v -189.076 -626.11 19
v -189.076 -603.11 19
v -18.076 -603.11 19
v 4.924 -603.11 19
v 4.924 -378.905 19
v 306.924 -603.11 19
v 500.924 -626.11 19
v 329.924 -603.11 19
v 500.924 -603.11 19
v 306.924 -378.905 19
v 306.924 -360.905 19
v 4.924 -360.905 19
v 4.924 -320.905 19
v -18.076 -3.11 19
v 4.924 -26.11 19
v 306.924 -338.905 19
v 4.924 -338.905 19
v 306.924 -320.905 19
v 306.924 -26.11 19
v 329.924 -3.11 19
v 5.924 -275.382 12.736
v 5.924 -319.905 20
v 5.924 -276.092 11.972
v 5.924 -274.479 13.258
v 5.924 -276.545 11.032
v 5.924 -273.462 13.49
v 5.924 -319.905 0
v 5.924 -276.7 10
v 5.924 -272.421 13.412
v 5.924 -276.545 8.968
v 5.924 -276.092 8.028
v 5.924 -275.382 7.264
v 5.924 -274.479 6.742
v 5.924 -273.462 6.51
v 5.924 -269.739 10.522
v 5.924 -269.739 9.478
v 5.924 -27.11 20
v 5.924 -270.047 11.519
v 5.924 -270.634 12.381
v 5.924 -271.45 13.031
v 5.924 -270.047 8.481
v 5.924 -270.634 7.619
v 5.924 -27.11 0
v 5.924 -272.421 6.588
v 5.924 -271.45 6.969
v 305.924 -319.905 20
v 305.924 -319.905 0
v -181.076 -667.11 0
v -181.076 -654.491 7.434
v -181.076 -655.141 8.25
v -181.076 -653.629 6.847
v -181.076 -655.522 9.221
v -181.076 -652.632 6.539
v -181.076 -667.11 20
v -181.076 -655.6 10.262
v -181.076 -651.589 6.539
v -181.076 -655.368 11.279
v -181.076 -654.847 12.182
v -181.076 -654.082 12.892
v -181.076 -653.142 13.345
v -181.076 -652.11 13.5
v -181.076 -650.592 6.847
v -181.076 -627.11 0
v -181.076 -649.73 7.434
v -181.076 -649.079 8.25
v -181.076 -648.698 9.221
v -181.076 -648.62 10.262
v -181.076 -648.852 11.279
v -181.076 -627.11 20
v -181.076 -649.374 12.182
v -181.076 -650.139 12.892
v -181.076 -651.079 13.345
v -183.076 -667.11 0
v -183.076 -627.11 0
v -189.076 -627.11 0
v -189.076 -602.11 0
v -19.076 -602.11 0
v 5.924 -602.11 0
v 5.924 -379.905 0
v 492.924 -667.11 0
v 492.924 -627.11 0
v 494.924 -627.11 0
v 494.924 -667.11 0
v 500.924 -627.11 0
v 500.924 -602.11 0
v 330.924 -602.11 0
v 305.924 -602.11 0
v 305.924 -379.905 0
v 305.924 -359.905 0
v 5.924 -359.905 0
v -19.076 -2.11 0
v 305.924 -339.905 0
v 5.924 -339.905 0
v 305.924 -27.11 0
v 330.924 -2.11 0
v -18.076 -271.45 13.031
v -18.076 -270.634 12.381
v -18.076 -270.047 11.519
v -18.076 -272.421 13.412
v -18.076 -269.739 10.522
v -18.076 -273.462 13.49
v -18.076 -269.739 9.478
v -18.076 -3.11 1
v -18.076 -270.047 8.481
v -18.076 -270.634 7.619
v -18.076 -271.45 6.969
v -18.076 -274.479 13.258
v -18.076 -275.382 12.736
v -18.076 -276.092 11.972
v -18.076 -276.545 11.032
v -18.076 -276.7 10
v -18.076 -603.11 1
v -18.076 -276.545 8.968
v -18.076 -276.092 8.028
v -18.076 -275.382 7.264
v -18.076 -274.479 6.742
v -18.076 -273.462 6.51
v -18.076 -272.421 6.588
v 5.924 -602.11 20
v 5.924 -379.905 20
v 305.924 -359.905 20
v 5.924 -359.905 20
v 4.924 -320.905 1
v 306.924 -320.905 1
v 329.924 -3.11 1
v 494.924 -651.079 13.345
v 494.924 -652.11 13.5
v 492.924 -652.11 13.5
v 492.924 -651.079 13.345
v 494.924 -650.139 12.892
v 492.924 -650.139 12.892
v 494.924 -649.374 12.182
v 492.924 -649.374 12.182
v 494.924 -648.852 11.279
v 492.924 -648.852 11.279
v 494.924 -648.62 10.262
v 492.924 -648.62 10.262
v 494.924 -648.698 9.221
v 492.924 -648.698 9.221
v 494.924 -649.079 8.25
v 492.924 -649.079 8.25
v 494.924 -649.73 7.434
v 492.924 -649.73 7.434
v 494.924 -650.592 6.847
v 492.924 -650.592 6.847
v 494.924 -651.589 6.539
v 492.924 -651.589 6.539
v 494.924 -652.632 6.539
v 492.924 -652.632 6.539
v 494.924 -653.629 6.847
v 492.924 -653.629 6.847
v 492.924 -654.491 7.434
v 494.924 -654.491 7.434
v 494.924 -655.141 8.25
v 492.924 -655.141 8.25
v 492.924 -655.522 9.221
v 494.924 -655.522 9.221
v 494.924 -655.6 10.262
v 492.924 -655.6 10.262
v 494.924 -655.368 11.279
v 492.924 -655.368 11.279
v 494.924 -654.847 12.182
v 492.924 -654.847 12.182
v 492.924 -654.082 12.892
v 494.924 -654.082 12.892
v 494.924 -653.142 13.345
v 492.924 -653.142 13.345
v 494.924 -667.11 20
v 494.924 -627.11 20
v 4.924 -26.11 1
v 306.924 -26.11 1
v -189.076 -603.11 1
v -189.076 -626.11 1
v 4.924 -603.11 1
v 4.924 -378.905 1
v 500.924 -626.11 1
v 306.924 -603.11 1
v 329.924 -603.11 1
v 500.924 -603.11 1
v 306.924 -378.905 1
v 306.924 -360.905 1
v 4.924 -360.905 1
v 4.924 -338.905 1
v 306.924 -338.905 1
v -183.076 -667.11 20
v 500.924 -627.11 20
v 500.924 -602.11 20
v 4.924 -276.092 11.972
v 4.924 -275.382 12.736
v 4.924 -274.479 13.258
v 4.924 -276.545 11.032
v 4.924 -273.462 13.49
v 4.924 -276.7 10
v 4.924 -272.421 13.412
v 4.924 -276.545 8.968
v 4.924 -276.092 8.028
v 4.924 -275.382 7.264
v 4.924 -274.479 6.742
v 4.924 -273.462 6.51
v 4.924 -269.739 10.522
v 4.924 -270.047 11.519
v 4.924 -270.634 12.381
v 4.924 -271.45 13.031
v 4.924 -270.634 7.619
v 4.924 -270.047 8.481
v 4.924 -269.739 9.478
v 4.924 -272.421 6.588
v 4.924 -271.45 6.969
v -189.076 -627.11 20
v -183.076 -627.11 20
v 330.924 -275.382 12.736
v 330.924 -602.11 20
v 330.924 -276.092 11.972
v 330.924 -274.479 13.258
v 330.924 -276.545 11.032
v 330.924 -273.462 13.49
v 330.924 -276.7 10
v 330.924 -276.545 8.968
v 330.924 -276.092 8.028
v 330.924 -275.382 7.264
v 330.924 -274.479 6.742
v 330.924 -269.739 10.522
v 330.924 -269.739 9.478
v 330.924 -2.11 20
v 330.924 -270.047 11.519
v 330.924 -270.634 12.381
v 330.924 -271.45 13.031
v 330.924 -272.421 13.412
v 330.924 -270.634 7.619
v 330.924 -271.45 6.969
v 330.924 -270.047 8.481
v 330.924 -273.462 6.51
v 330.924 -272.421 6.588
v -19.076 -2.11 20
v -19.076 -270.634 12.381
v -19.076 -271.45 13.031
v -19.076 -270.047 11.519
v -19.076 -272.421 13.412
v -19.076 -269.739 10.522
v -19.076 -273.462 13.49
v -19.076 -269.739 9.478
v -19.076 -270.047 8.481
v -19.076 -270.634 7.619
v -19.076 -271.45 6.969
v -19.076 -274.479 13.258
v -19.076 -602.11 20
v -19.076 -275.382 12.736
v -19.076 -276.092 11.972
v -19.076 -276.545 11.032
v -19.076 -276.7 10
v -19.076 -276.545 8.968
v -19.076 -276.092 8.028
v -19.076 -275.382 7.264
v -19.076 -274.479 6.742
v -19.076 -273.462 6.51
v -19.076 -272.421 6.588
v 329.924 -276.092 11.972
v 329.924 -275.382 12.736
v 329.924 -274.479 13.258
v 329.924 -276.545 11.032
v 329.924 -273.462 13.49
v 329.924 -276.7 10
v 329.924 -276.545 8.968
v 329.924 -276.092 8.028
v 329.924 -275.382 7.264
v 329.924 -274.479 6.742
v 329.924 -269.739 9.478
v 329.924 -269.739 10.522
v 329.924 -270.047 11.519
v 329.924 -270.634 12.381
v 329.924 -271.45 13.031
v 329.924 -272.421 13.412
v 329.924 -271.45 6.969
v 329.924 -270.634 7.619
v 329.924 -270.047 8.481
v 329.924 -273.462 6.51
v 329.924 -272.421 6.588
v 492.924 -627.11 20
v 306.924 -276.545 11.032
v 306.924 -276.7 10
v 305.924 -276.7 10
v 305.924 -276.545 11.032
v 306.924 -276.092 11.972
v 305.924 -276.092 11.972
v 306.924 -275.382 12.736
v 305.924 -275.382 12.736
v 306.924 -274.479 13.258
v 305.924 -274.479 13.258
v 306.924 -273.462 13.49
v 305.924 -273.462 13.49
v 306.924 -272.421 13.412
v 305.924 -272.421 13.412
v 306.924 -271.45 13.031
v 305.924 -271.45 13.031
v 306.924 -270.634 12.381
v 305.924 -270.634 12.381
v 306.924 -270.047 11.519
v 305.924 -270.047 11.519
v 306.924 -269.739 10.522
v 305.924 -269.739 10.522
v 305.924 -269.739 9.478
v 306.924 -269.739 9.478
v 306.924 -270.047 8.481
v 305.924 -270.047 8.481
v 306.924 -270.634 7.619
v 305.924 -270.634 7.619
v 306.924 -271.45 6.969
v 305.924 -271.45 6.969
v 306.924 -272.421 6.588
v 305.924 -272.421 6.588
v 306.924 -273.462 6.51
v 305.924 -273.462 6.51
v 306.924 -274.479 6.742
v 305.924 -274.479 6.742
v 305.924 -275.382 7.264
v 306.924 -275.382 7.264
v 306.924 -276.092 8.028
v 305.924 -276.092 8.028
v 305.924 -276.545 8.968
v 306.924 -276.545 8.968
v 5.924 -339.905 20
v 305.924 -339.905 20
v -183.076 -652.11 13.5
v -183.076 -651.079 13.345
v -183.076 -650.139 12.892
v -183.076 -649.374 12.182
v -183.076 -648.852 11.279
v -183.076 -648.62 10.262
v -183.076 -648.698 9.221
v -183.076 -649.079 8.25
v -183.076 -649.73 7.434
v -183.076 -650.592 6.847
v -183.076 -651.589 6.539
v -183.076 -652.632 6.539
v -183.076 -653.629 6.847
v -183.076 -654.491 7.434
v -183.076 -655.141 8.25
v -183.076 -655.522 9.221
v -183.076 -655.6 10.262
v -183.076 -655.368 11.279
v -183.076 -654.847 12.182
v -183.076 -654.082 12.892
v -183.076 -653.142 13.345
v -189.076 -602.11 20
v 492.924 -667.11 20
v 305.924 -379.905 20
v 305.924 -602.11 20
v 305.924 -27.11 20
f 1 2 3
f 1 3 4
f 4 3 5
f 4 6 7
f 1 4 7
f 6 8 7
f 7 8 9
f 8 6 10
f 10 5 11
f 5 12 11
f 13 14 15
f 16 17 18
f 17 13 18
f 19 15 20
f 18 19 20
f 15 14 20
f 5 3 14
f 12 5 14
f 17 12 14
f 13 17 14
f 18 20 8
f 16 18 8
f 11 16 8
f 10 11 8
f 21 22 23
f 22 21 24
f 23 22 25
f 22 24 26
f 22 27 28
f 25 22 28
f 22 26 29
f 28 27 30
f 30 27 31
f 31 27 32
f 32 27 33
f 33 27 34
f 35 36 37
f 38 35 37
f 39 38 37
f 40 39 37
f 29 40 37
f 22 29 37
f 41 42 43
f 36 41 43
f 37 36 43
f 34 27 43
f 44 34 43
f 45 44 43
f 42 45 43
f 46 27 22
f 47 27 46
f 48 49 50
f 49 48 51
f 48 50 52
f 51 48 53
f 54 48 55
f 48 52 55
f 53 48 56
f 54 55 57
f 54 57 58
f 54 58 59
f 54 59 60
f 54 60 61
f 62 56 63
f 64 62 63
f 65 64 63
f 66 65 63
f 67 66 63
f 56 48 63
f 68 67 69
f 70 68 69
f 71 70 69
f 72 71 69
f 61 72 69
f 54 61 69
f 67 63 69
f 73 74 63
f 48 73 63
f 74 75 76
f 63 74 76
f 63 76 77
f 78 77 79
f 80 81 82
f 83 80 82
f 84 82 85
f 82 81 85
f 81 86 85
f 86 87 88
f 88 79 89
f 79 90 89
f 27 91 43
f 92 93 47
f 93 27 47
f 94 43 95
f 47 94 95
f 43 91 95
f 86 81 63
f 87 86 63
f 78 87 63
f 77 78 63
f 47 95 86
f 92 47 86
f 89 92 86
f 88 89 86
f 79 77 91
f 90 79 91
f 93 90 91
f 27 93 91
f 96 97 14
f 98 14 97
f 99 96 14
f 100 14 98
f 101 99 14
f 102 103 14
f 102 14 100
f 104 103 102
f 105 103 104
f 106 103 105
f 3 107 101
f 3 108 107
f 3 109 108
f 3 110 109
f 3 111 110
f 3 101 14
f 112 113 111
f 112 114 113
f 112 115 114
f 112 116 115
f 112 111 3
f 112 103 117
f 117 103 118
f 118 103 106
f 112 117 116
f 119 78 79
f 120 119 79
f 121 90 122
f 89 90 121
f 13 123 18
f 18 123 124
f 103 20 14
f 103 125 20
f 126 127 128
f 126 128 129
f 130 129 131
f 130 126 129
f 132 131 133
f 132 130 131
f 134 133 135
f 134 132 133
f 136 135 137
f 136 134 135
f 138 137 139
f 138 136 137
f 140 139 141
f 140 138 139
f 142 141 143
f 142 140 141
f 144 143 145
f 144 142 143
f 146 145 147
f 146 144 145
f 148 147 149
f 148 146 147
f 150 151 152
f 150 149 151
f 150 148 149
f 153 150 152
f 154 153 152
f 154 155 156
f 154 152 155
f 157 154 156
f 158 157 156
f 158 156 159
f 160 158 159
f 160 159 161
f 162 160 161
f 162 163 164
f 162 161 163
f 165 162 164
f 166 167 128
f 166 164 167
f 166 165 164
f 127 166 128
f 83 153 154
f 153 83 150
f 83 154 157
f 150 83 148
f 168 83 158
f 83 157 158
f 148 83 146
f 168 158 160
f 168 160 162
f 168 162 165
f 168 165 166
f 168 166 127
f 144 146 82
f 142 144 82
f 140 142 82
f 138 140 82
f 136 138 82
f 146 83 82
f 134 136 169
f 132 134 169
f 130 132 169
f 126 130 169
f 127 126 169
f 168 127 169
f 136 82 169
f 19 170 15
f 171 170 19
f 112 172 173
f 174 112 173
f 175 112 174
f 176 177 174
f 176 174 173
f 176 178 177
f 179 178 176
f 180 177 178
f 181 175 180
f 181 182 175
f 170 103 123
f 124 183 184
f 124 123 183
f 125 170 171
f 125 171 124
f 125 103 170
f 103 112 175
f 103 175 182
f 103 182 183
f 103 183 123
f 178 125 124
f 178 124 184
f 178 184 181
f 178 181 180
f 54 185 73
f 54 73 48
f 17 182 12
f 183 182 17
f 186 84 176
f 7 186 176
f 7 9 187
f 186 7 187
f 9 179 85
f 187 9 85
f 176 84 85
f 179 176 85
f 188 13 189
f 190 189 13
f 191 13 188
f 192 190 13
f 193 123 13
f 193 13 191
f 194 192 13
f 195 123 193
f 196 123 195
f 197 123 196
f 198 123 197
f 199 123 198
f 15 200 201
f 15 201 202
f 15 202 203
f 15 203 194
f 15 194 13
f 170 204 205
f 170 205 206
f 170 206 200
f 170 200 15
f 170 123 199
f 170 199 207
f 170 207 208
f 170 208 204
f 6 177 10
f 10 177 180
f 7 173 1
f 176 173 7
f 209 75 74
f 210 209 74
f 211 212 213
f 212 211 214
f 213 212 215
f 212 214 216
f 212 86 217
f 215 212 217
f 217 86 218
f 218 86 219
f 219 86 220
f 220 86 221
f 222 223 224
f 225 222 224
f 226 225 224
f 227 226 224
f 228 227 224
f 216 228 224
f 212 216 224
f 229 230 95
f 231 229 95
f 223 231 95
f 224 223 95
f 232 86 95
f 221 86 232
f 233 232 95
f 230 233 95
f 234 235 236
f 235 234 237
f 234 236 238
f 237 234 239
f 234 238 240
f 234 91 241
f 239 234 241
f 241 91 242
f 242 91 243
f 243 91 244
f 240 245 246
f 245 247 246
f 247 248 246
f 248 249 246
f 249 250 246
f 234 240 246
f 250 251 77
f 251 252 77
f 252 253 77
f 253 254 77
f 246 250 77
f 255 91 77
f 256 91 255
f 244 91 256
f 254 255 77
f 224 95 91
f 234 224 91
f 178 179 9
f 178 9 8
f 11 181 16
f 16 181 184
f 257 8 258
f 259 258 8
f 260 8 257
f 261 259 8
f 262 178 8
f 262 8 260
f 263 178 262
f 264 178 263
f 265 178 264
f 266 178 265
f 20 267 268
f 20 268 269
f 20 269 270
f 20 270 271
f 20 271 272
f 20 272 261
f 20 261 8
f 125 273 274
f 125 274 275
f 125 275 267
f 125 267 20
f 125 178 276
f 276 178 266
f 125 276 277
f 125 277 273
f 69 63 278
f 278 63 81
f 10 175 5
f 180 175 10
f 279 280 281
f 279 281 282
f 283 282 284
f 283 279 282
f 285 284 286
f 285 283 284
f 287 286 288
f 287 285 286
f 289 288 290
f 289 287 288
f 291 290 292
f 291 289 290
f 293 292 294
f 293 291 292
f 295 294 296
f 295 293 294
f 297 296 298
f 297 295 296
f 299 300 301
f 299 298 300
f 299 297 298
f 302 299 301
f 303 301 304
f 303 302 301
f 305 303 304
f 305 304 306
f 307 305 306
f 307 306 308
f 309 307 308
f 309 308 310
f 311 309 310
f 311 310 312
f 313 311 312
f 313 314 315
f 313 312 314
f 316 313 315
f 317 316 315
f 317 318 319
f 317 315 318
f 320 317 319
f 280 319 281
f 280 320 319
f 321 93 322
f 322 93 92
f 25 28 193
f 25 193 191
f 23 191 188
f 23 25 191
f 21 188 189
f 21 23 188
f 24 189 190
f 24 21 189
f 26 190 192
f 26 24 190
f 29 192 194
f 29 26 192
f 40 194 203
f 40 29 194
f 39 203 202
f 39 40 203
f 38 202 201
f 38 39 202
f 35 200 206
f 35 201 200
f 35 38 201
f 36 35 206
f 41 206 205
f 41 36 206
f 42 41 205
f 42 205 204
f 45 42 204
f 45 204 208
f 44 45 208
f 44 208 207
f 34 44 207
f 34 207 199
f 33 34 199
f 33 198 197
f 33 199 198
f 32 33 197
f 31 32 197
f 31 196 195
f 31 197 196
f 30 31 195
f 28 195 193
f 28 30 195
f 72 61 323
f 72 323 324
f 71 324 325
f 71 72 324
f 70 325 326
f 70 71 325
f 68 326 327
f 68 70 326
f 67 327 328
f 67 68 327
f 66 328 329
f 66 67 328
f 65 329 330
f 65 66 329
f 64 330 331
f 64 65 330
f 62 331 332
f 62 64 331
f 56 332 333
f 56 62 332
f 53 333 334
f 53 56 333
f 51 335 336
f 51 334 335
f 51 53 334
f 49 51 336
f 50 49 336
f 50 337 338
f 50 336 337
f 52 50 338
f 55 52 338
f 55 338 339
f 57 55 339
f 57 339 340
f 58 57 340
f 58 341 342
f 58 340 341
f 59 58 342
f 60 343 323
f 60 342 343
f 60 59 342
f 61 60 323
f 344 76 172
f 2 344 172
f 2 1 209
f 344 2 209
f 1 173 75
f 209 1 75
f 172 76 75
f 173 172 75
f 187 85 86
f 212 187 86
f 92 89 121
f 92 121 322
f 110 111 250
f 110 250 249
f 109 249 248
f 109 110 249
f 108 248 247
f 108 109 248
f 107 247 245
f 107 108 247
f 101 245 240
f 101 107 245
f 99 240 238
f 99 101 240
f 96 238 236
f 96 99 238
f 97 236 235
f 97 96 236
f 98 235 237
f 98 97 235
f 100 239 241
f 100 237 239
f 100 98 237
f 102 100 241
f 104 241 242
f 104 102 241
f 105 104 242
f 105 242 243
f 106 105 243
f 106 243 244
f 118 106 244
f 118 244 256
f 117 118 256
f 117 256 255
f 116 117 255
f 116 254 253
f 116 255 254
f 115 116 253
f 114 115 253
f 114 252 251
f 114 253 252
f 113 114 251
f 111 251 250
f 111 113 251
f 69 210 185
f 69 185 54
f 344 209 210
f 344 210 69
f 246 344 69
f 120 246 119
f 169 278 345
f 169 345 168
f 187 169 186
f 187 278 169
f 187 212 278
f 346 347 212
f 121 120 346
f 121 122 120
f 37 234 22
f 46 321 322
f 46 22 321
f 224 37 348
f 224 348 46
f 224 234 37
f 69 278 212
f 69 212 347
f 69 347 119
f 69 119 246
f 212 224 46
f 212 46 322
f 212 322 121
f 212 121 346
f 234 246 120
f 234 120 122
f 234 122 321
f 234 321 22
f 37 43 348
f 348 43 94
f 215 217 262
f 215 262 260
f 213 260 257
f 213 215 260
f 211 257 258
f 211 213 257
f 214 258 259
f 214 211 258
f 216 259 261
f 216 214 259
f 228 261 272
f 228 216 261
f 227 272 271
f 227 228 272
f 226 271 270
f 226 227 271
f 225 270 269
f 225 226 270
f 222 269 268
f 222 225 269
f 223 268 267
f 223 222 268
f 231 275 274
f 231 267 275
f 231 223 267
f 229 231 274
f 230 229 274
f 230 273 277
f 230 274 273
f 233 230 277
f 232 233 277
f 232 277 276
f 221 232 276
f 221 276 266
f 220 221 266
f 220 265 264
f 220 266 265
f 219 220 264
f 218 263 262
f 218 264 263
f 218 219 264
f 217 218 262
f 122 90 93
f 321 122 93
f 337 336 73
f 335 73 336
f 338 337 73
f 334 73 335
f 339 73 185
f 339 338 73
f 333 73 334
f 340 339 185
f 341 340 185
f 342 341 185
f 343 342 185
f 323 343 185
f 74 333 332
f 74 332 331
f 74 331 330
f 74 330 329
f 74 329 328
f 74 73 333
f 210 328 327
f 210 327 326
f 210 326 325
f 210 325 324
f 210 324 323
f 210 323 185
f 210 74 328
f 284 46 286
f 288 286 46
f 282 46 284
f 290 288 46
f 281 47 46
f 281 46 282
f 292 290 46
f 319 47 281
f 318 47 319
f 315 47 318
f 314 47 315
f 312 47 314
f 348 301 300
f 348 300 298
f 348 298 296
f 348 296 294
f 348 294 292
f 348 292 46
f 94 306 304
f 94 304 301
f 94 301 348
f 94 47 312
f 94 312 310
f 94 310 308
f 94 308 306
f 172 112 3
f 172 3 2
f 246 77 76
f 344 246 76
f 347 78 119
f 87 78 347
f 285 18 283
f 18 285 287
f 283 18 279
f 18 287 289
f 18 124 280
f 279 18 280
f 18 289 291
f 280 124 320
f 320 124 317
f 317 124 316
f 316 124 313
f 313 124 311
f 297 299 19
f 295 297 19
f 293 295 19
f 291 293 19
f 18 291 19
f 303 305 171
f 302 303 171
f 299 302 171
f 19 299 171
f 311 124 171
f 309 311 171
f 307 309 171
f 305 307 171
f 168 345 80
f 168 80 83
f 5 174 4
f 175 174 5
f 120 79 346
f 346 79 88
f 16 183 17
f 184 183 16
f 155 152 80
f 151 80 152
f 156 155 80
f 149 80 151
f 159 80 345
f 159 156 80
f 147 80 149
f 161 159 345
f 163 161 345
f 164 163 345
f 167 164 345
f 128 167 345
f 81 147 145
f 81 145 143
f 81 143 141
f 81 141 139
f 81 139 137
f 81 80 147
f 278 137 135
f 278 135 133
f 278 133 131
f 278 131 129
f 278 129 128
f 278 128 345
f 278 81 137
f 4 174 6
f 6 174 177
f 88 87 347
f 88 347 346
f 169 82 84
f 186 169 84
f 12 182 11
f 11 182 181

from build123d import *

# Parameters (mm, degrees)
SKETCH2_W               = 300
SKETCH2_H               = 292.795139568
SKETCH2_H_2             = 222.204860432
SKETCH2_H_3             = 20
BOSS_EXTRUDE1_DEPTH     = 20
SHELL1_T                = -1
SKETCH3_W               = 2
SKETCH3_H               = 20
BOSS_EXTRUDE2_DEPTH     = 40
CUT_EXTRUDE1_DEPTH      = 960.966652524
CUT_EXTRUDE1_DEPTH_BACK = 960.966652524
SKETCH4_R               = 3.5
CUT_EXTRUDE2_DEPTH      = 847.070903624
CUT_EXTRUDE2_DEPTH_BACK = 847.070903624
SKETCH5_R               = 3.5


with BuildPart() as part:
    # Sketch2 → Boss-Extrude1 (new body)
    with BuildSketch(Plane.XY):
        Polygon((-19.075846715, -602.110166283), (-189.075846715, -602.110166283), (-189.075846715, -627.110166283), (500.924153285, -627.110166283), (500.924153285, -602.110166283), (330.924153285, -602.110166283), (330.924153285, -2.110166283), (-19.075846715, -2.110166283), align=None)
        with Locations((155.924153285, -173.507736067)):
            Rectangle(SKETCH2_W, SKETCH2_H, mode=Mode.SUBTRACT)
        with Locations((155.924153285, -491.007736067)):
            Rectangle(SKETCH2_W, SKETCH2_H_2, mode=Mode.SUBTRACT)
        with Locations((155.924153285, -349.905305851)):
            Rectangle(SKETCH2_W, SKETCH2_H_3, mode=Mode.SUBTRACT)
    extrude(amount=BOSS_EXTRUDE1_DEPTH)

    # Shell1
    shell1_openings = [part.faces().sort_by_distance(p)[0] for p in [
        (500.924153285, -614.610166283, 10),
        (-189.075846715, -614.610166283, 10),
    ]]
    offset(amount=SHELL1_T, openings=shell1_openings, kind=Kind.INTERSECTION)

    # Sketch3 → Boss-Extrude2 (add)
    with BuildSketch(Plane.XZ.offset(627.110166283)):
        with Locations((493.924153285, 10)):
            Rectangle(SKETCH3_W, SKETCH3_H)
        with Locations((-182.075846715, 10)):
            Rectangle(SKETCH3_W, SKETCH3_H)
    extrude(amount=BOSS_EXTRUDE2_DEPTH)

    # Sketch4 → Cut-Extrude1 (cut, two sides: drawn at the far end of the back side and taken through both)
    with BuildSketch(Plane.ZY.offset(189.075846715).offset(-CUT_EXTRUDE1_DEPTH_BACK)):
        with Locations((10, -652.110166283)):
            Circle(SKETCH4_R)
    extrude(amount=CUT_EXTRUDE1_DEPTH + CUT_EXTRUDE1_DEPTH_BACK, mode=Mode.SUBTRACT)

    # Sketch5 → Cut-Extrude2 (cut, two sides: drawn at the far end of the back side and taken through both)
    with BuildSketch(Plane.ZY.offset(19.075846715).offset(-CUT_EXTRUDE2_DEPTH_BACK)):
        with Locations(Location((10, -273.200166283, 0), (0, 0, 270))):
            Circle(SKETCH5_R)
    extrude(amount=CUT_EXTRUDE2_DEPTH + CUT_EXTRUDE2_DEPTH_BACK, mode=Mode.SUBTRACT)


solid = part.part
